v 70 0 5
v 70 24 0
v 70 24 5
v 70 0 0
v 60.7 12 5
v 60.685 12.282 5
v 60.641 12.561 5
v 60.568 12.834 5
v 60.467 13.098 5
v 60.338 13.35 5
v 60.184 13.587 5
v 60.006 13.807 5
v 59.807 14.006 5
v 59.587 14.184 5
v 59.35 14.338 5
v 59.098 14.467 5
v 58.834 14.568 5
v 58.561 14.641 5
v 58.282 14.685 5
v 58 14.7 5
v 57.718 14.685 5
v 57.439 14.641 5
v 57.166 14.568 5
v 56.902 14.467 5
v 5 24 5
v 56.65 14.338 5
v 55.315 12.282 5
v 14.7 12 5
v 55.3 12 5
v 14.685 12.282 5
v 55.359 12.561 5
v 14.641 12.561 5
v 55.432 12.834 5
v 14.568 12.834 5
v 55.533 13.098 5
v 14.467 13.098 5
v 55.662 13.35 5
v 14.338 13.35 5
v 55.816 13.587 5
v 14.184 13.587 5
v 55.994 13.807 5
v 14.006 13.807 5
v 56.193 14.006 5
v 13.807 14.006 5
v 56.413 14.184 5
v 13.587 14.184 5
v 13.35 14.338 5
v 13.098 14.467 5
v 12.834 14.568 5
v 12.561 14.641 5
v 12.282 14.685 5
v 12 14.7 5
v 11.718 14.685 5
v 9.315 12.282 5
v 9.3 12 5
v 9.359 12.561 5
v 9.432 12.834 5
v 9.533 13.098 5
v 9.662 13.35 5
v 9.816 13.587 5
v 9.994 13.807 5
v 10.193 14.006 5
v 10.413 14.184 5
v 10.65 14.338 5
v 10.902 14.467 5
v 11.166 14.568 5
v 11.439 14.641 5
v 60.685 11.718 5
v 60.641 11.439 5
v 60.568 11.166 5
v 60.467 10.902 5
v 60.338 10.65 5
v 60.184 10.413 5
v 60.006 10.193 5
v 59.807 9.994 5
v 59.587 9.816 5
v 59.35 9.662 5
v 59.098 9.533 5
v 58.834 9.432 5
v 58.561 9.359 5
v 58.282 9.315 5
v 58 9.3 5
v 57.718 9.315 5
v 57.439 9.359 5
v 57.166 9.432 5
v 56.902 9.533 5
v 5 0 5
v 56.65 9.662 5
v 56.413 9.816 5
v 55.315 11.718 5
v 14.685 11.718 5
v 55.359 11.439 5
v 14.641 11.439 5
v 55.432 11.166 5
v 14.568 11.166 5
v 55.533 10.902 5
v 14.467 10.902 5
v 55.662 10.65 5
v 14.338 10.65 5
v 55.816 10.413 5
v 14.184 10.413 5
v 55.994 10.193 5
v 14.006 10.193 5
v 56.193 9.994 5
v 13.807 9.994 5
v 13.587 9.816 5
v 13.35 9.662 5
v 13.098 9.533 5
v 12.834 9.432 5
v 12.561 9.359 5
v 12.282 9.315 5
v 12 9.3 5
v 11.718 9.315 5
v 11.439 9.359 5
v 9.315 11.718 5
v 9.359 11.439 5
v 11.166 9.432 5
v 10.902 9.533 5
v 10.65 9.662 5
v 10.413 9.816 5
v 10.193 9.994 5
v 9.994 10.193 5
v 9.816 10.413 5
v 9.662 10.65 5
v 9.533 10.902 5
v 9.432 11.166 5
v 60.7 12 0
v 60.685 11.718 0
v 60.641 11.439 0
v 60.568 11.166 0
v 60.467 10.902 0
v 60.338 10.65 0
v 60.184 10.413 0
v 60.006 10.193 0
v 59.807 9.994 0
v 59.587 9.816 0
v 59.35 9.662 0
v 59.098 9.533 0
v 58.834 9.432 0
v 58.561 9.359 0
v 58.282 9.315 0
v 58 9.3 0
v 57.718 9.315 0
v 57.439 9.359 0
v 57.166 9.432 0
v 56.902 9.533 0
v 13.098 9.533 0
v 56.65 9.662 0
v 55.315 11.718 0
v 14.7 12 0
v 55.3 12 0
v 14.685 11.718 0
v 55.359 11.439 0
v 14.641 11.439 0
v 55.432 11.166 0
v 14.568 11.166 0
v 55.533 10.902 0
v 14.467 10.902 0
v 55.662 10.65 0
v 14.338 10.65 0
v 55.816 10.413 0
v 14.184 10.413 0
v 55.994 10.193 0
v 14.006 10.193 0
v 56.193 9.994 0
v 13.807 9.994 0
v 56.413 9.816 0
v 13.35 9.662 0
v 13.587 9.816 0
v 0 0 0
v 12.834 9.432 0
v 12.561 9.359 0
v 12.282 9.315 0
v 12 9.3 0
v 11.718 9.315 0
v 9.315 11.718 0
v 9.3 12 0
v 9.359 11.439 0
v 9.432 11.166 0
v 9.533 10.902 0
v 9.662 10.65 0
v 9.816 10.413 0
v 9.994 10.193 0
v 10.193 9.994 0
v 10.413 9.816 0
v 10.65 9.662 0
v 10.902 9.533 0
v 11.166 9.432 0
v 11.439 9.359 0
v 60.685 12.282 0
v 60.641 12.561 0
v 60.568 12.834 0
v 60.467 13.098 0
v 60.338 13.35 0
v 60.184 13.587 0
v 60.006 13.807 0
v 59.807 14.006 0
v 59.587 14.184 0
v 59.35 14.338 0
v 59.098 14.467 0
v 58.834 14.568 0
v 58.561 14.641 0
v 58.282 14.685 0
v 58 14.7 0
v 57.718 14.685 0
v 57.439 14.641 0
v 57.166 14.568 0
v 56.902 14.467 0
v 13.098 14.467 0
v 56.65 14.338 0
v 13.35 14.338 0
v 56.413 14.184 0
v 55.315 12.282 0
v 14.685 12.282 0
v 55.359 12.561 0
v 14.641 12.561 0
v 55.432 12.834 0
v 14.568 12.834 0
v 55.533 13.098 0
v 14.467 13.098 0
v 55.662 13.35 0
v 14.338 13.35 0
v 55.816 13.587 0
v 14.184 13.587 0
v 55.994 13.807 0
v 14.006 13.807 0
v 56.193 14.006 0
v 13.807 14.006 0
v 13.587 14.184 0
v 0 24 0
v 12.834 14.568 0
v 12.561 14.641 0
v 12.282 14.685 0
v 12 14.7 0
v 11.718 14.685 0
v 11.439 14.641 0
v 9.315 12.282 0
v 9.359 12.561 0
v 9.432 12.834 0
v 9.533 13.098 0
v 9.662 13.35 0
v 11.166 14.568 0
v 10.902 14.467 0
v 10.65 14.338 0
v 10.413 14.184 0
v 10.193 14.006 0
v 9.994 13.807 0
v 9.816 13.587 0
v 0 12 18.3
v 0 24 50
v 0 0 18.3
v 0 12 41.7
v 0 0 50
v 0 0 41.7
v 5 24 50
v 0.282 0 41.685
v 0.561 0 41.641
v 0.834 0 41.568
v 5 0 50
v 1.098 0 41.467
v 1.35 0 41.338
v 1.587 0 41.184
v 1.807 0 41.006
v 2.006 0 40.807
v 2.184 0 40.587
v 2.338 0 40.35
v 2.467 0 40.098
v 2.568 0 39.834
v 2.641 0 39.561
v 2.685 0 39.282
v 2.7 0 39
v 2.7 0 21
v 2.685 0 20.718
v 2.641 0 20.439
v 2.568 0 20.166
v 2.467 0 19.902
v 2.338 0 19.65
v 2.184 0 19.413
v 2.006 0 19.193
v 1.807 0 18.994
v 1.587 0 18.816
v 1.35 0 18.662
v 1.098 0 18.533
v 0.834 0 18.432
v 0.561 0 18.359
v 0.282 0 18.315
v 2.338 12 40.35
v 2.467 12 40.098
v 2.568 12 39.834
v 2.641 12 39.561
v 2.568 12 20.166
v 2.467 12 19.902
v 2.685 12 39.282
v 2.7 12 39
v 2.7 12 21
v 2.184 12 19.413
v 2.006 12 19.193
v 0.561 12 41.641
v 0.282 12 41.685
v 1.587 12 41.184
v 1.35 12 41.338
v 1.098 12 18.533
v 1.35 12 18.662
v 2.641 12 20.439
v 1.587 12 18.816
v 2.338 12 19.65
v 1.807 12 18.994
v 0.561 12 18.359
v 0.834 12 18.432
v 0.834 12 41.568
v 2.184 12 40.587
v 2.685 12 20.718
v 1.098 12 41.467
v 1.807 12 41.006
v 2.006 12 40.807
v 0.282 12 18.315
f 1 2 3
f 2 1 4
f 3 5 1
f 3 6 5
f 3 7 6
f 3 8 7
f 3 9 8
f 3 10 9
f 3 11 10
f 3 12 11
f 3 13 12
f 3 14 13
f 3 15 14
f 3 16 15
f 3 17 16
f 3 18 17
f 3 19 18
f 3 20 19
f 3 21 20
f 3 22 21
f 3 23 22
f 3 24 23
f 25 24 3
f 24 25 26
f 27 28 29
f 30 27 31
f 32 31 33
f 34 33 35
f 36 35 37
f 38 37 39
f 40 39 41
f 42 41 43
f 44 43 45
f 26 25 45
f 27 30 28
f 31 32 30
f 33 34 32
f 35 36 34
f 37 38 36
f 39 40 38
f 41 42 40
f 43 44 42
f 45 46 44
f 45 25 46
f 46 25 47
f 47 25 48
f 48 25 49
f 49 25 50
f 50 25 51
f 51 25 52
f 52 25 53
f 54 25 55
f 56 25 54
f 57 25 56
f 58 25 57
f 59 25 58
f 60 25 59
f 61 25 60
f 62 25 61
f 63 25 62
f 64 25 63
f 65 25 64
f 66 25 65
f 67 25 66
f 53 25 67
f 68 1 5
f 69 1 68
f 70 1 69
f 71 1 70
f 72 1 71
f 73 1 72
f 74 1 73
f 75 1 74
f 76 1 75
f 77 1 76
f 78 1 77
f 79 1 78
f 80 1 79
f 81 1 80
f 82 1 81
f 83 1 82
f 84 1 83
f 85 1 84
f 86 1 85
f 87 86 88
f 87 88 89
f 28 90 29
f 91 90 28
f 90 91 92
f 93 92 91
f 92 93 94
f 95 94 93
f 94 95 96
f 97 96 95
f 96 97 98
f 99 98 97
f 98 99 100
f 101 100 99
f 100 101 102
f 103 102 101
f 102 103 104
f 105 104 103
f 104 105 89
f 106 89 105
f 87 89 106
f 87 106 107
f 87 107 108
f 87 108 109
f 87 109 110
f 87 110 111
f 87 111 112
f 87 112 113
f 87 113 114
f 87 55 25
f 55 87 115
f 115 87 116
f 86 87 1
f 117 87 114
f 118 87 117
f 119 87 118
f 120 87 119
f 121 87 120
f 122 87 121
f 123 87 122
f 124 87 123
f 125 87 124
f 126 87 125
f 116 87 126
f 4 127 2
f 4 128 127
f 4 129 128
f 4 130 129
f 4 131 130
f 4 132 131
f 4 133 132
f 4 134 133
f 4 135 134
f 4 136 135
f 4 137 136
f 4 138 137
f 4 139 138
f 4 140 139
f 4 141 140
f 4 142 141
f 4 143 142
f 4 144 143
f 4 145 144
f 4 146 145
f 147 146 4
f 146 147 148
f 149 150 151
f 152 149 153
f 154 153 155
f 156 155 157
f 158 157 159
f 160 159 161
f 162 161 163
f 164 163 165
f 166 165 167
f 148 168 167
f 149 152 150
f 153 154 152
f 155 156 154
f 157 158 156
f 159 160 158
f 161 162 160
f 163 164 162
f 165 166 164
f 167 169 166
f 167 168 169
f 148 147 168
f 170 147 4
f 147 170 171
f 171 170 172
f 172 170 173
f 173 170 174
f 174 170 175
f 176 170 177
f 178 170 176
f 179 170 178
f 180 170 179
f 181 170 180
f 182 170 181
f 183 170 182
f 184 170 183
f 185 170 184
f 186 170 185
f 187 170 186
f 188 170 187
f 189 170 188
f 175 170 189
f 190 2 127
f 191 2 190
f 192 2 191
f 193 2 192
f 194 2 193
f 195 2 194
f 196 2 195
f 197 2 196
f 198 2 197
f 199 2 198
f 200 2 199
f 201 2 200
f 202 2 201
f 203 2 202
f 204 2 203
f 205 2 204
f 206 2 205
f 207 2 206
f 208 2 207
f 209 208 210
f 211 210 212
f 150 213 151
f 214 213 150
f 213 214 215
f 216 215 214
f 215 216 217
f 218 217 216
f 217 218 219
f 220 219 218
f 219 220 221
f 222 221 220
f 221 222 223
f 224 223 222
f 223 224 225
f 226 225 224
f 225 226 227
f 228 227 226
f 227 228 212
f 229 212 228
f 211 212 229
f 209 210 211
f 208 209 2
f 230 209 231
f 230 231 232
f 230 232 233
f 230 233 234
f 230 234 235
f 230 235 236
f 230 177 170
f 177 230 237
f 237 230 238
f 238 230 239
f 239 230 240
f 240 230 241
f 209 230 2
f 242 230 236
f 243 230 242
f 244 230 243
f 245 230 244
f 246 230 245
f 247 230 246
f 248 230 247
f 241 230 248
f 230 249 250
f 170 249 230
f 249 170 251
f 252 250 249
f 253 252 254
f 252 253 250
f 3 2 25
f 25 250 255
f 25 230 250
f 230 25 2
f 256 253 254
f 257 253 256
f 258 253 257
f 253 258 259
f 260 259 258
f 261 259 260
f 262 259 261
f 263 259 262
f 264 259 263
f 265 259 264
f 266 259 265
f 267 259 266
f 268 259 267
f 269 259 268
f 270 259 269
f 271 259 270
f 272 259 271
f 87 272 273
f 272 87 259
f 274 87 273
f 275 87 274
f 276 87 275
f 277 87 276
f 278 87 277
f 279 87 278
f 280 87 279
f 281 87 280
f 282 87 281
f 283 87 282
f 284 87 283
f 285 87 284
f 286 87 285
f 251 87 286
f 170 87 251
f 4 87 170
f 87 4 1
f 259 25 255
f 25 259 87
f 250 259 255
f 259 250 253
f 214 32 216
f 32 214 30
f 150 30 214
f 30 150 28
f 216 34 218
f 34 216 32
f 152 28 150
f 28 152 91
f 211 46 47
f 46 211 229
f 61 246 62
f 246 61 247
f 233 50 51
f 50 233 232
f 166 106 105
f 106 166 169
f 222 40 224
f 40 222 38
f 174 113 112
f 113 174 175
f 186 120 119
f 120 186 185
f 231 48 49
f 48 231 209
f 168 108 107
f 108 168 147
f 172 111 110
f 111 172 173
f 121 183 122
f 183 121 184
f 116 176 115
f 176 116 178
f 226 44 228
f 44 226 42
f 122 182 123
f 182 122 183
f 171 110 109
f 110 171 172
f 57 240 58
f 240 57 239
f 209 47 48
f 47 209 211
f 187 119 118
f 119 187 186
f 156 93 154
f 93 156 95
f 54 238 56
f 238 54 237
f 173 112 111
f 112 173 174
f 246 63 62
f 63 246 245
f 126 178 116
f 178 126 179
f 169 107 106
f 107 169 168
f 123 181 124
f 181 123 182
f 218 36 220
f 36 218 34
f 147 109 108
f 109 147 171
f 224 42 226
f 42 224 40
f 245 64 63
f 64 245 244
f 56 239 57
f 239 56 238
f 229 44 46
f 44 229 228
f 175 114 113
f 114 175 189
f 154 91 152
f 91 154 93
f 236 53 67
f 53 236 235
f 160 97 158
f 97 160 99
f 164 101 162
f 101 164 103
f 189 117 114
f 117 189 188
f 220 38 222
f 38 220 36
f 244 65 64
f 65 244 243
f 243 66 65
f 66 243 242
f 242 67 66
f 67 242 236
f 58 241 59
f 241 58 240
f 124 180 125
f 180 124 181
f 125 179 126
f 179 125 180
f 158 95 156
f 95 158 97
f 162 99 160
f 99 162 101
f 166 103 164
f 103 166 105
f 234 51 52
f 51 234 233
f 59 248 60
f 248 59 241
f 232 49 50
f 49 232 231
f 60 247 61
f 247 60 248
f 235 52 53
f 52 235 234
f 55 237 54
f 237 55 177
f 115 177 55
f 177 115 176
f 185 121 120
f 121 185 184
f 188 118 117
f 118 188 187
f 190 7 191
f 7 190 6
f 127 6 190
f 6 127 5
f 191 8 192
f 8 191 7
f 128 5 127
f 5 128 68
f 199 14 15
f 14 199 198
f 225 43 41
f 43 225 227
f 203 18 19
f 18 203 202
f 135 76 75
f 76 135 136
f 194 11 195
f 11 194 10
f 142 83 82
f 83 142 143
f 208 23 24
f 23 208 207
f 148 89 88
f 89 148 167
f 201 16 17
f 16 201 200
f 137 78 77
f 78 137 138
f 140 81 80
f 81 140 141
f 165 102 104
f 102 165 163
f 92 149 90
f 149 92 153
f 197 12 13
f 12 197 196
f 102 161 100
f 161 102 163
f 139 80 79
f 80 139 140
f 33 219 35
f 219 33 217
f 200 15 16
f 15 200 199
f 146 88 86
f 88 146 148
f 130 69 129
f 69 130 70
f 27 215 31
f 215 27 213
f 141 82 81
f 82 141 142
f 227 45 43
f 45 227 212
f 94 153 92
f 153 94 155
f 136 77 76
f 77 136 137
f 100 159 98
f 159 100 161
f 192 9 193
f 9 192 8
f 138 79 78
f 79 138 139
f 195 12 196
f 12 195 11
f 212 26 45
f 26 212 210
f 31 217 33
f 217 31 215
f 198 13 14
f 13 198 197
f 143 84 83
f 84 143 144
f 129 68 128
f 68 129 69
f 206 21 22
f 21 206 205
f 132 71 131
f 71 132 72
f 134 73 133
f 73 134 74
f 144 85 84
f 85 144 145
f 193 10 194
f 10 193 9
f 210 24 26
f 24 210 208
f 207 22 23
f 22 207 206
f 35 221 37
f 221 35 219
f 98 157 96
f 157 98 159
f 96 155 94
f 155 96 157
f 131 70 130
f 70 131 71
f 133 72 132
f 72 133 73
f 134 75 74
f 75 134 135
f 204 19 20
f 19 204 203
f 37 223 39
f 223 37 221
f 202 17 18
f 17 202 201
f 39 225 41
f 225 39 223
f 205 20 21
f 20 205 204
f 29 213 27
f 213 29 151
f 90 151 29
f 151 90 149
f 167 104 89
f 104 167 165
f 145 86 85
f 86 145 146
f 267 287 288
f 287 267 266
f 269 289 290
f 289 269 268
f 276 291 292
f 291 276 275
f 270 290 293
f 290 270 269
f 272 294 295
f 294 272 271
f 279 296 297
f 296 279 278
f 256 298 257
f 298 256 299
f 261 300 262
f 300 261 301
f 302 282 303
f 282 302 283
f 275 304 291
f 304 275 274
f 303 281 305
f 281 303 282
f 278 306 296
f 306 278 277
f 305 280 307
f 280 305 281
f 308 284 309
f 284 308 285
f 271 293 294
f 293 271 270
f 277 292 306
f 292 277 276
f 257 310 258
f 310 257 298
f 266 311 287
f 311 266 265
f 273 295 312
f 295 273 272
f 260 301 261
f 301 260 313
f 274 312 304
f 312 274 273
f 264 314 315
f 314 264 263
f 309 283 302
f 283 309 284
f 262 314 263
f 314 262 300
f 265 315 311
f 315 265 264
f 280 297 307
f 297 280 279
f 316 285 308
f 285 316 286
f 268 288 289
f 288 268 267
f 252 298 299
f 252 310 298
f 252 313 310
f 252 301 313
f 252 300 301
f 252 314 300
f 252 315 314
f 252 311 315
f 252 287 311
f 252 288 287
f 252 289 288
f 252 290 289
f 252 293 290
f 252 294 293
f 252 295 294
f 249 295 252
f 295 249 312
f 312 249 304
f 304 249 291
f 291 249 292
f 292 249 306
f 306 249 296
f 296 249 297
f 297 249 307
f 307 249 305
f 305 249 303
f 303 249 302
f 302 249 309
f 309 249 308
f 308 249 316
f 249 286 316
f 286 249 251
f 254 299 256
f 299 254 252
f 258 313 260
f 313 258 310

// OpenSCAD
// Adjustable L bracket with upright slot.
$fn = 60;
eps = 0.02;
base_l = 70;
upright_h = 50;
width = 24;
thickness = 5;
slot_l = 18;
module vertical_slot() { hull() { translate([0,width/2,thickness+upright_h/2-slot_l/2]) rotate([90,0,0]) cylinder(d=5.4,h=width+2*eps); translate([0,width/2,thickness+upright_h/2+slot_l/2]) rotate([90,0,0]) cylinder(d=5.4,h=width+2*eps); } }
difference() {
    union() { cube([base_l,width,thickness]); cube([thickness,width,upright_h]); }
    for(x=[12,base_l-12]) translate([x,width/2,-eps]) cylinder(d=5.4,h=thickness+2*eps);
    vertical_slot();
}
